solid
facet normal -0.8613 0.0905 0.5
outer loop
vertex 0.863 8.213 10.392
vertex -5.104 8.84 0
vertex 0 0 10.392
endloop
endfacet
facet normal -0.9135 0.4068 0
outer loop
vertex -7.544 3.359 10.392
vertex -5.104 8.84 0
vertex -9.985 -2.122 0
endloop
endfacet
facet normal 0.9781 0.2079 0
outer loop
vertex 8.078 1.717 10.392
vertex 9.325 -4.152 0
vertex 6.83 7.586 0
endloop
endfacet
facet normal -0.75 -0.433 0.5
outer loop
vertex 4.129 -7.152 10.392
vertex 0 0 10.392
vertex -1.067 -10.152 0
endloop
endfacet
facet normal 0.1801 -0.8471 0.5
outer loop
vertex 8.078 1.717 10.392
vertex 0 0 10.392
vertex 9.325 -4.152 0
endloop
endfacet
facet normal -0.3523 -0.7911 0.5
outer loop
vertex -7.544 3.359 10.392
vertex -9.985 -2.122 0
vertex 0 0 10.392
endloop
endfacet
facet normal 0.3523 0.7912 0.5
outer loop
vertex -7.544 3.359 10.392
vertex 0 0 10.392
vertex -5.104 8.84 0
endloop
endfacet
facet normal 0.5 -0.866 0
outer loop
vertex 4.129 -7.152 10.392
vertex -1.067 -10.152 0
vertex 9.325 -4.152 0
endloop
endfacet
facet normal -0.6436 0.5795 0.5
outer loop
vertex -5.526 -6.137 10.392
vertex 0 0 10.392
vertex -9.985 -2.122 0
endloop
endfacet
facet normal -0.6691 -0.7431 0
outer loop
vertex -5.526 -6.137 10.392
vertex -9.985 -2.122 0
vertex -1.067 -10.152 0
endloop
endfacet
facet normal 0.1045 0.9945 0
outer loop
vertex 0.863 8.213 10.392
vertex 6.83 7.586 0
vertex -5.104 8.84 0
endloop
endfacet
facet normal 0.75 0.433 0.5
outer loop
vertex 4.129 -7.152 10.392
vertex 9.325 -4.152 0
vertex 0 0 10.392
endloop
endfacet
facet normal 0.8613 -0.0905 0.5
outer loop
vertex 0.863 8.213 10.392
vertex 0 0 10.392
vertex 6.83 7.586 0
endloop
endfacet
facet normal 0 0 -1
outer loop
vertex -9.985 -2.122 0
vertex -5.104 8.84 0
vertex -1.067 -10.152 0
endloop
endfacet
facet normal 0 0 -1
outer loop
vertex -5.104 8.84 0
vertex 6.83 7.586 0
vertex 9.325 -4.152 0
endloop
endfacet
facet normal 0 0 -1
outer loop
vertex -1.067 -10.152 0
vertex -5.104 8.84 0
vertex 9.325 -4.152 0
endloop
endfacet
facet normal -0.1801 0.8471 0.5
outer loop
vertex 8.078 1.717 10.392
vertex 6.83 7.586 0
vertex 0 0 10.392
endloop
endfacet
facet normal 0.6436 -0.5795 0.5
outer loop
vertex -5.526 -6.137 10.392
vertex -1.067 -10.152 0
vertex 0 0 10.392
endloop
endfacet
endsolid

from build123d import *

# Parameters (mm, degrees)
F2_DEPTH = 8.2582915228
F4_COUNT = 5
F5_ANGLE = 30


with BuildPart() as f2:
    # F1 (on Front) → F2 (new body, through all)
    with BuildSketch(Plane.XZ):
        Polygon((0, 10.3923048454), (-6, 0), (6, 0), align=None)
    extrude(amount=F2_DEPTH)

    # F4: F2 ×5 about axis
    f4_axis = Axis((0, 0, 5.1961524227), (0, 0, 1))


with BuildPart() as f2_1:
    add(f2.part)
    for i in range(1, F4_COUNT):
        add(f2.part.rotate(f4_axis, i * 360 / F4_COUNT))


with BuildPart() as f2_2:
    # F5: moved
    add(f2_1.part.rotate(Axis((0, 0, 0), (0, 0, 1)), F5_ANGLE))


solid = f2_2.part
